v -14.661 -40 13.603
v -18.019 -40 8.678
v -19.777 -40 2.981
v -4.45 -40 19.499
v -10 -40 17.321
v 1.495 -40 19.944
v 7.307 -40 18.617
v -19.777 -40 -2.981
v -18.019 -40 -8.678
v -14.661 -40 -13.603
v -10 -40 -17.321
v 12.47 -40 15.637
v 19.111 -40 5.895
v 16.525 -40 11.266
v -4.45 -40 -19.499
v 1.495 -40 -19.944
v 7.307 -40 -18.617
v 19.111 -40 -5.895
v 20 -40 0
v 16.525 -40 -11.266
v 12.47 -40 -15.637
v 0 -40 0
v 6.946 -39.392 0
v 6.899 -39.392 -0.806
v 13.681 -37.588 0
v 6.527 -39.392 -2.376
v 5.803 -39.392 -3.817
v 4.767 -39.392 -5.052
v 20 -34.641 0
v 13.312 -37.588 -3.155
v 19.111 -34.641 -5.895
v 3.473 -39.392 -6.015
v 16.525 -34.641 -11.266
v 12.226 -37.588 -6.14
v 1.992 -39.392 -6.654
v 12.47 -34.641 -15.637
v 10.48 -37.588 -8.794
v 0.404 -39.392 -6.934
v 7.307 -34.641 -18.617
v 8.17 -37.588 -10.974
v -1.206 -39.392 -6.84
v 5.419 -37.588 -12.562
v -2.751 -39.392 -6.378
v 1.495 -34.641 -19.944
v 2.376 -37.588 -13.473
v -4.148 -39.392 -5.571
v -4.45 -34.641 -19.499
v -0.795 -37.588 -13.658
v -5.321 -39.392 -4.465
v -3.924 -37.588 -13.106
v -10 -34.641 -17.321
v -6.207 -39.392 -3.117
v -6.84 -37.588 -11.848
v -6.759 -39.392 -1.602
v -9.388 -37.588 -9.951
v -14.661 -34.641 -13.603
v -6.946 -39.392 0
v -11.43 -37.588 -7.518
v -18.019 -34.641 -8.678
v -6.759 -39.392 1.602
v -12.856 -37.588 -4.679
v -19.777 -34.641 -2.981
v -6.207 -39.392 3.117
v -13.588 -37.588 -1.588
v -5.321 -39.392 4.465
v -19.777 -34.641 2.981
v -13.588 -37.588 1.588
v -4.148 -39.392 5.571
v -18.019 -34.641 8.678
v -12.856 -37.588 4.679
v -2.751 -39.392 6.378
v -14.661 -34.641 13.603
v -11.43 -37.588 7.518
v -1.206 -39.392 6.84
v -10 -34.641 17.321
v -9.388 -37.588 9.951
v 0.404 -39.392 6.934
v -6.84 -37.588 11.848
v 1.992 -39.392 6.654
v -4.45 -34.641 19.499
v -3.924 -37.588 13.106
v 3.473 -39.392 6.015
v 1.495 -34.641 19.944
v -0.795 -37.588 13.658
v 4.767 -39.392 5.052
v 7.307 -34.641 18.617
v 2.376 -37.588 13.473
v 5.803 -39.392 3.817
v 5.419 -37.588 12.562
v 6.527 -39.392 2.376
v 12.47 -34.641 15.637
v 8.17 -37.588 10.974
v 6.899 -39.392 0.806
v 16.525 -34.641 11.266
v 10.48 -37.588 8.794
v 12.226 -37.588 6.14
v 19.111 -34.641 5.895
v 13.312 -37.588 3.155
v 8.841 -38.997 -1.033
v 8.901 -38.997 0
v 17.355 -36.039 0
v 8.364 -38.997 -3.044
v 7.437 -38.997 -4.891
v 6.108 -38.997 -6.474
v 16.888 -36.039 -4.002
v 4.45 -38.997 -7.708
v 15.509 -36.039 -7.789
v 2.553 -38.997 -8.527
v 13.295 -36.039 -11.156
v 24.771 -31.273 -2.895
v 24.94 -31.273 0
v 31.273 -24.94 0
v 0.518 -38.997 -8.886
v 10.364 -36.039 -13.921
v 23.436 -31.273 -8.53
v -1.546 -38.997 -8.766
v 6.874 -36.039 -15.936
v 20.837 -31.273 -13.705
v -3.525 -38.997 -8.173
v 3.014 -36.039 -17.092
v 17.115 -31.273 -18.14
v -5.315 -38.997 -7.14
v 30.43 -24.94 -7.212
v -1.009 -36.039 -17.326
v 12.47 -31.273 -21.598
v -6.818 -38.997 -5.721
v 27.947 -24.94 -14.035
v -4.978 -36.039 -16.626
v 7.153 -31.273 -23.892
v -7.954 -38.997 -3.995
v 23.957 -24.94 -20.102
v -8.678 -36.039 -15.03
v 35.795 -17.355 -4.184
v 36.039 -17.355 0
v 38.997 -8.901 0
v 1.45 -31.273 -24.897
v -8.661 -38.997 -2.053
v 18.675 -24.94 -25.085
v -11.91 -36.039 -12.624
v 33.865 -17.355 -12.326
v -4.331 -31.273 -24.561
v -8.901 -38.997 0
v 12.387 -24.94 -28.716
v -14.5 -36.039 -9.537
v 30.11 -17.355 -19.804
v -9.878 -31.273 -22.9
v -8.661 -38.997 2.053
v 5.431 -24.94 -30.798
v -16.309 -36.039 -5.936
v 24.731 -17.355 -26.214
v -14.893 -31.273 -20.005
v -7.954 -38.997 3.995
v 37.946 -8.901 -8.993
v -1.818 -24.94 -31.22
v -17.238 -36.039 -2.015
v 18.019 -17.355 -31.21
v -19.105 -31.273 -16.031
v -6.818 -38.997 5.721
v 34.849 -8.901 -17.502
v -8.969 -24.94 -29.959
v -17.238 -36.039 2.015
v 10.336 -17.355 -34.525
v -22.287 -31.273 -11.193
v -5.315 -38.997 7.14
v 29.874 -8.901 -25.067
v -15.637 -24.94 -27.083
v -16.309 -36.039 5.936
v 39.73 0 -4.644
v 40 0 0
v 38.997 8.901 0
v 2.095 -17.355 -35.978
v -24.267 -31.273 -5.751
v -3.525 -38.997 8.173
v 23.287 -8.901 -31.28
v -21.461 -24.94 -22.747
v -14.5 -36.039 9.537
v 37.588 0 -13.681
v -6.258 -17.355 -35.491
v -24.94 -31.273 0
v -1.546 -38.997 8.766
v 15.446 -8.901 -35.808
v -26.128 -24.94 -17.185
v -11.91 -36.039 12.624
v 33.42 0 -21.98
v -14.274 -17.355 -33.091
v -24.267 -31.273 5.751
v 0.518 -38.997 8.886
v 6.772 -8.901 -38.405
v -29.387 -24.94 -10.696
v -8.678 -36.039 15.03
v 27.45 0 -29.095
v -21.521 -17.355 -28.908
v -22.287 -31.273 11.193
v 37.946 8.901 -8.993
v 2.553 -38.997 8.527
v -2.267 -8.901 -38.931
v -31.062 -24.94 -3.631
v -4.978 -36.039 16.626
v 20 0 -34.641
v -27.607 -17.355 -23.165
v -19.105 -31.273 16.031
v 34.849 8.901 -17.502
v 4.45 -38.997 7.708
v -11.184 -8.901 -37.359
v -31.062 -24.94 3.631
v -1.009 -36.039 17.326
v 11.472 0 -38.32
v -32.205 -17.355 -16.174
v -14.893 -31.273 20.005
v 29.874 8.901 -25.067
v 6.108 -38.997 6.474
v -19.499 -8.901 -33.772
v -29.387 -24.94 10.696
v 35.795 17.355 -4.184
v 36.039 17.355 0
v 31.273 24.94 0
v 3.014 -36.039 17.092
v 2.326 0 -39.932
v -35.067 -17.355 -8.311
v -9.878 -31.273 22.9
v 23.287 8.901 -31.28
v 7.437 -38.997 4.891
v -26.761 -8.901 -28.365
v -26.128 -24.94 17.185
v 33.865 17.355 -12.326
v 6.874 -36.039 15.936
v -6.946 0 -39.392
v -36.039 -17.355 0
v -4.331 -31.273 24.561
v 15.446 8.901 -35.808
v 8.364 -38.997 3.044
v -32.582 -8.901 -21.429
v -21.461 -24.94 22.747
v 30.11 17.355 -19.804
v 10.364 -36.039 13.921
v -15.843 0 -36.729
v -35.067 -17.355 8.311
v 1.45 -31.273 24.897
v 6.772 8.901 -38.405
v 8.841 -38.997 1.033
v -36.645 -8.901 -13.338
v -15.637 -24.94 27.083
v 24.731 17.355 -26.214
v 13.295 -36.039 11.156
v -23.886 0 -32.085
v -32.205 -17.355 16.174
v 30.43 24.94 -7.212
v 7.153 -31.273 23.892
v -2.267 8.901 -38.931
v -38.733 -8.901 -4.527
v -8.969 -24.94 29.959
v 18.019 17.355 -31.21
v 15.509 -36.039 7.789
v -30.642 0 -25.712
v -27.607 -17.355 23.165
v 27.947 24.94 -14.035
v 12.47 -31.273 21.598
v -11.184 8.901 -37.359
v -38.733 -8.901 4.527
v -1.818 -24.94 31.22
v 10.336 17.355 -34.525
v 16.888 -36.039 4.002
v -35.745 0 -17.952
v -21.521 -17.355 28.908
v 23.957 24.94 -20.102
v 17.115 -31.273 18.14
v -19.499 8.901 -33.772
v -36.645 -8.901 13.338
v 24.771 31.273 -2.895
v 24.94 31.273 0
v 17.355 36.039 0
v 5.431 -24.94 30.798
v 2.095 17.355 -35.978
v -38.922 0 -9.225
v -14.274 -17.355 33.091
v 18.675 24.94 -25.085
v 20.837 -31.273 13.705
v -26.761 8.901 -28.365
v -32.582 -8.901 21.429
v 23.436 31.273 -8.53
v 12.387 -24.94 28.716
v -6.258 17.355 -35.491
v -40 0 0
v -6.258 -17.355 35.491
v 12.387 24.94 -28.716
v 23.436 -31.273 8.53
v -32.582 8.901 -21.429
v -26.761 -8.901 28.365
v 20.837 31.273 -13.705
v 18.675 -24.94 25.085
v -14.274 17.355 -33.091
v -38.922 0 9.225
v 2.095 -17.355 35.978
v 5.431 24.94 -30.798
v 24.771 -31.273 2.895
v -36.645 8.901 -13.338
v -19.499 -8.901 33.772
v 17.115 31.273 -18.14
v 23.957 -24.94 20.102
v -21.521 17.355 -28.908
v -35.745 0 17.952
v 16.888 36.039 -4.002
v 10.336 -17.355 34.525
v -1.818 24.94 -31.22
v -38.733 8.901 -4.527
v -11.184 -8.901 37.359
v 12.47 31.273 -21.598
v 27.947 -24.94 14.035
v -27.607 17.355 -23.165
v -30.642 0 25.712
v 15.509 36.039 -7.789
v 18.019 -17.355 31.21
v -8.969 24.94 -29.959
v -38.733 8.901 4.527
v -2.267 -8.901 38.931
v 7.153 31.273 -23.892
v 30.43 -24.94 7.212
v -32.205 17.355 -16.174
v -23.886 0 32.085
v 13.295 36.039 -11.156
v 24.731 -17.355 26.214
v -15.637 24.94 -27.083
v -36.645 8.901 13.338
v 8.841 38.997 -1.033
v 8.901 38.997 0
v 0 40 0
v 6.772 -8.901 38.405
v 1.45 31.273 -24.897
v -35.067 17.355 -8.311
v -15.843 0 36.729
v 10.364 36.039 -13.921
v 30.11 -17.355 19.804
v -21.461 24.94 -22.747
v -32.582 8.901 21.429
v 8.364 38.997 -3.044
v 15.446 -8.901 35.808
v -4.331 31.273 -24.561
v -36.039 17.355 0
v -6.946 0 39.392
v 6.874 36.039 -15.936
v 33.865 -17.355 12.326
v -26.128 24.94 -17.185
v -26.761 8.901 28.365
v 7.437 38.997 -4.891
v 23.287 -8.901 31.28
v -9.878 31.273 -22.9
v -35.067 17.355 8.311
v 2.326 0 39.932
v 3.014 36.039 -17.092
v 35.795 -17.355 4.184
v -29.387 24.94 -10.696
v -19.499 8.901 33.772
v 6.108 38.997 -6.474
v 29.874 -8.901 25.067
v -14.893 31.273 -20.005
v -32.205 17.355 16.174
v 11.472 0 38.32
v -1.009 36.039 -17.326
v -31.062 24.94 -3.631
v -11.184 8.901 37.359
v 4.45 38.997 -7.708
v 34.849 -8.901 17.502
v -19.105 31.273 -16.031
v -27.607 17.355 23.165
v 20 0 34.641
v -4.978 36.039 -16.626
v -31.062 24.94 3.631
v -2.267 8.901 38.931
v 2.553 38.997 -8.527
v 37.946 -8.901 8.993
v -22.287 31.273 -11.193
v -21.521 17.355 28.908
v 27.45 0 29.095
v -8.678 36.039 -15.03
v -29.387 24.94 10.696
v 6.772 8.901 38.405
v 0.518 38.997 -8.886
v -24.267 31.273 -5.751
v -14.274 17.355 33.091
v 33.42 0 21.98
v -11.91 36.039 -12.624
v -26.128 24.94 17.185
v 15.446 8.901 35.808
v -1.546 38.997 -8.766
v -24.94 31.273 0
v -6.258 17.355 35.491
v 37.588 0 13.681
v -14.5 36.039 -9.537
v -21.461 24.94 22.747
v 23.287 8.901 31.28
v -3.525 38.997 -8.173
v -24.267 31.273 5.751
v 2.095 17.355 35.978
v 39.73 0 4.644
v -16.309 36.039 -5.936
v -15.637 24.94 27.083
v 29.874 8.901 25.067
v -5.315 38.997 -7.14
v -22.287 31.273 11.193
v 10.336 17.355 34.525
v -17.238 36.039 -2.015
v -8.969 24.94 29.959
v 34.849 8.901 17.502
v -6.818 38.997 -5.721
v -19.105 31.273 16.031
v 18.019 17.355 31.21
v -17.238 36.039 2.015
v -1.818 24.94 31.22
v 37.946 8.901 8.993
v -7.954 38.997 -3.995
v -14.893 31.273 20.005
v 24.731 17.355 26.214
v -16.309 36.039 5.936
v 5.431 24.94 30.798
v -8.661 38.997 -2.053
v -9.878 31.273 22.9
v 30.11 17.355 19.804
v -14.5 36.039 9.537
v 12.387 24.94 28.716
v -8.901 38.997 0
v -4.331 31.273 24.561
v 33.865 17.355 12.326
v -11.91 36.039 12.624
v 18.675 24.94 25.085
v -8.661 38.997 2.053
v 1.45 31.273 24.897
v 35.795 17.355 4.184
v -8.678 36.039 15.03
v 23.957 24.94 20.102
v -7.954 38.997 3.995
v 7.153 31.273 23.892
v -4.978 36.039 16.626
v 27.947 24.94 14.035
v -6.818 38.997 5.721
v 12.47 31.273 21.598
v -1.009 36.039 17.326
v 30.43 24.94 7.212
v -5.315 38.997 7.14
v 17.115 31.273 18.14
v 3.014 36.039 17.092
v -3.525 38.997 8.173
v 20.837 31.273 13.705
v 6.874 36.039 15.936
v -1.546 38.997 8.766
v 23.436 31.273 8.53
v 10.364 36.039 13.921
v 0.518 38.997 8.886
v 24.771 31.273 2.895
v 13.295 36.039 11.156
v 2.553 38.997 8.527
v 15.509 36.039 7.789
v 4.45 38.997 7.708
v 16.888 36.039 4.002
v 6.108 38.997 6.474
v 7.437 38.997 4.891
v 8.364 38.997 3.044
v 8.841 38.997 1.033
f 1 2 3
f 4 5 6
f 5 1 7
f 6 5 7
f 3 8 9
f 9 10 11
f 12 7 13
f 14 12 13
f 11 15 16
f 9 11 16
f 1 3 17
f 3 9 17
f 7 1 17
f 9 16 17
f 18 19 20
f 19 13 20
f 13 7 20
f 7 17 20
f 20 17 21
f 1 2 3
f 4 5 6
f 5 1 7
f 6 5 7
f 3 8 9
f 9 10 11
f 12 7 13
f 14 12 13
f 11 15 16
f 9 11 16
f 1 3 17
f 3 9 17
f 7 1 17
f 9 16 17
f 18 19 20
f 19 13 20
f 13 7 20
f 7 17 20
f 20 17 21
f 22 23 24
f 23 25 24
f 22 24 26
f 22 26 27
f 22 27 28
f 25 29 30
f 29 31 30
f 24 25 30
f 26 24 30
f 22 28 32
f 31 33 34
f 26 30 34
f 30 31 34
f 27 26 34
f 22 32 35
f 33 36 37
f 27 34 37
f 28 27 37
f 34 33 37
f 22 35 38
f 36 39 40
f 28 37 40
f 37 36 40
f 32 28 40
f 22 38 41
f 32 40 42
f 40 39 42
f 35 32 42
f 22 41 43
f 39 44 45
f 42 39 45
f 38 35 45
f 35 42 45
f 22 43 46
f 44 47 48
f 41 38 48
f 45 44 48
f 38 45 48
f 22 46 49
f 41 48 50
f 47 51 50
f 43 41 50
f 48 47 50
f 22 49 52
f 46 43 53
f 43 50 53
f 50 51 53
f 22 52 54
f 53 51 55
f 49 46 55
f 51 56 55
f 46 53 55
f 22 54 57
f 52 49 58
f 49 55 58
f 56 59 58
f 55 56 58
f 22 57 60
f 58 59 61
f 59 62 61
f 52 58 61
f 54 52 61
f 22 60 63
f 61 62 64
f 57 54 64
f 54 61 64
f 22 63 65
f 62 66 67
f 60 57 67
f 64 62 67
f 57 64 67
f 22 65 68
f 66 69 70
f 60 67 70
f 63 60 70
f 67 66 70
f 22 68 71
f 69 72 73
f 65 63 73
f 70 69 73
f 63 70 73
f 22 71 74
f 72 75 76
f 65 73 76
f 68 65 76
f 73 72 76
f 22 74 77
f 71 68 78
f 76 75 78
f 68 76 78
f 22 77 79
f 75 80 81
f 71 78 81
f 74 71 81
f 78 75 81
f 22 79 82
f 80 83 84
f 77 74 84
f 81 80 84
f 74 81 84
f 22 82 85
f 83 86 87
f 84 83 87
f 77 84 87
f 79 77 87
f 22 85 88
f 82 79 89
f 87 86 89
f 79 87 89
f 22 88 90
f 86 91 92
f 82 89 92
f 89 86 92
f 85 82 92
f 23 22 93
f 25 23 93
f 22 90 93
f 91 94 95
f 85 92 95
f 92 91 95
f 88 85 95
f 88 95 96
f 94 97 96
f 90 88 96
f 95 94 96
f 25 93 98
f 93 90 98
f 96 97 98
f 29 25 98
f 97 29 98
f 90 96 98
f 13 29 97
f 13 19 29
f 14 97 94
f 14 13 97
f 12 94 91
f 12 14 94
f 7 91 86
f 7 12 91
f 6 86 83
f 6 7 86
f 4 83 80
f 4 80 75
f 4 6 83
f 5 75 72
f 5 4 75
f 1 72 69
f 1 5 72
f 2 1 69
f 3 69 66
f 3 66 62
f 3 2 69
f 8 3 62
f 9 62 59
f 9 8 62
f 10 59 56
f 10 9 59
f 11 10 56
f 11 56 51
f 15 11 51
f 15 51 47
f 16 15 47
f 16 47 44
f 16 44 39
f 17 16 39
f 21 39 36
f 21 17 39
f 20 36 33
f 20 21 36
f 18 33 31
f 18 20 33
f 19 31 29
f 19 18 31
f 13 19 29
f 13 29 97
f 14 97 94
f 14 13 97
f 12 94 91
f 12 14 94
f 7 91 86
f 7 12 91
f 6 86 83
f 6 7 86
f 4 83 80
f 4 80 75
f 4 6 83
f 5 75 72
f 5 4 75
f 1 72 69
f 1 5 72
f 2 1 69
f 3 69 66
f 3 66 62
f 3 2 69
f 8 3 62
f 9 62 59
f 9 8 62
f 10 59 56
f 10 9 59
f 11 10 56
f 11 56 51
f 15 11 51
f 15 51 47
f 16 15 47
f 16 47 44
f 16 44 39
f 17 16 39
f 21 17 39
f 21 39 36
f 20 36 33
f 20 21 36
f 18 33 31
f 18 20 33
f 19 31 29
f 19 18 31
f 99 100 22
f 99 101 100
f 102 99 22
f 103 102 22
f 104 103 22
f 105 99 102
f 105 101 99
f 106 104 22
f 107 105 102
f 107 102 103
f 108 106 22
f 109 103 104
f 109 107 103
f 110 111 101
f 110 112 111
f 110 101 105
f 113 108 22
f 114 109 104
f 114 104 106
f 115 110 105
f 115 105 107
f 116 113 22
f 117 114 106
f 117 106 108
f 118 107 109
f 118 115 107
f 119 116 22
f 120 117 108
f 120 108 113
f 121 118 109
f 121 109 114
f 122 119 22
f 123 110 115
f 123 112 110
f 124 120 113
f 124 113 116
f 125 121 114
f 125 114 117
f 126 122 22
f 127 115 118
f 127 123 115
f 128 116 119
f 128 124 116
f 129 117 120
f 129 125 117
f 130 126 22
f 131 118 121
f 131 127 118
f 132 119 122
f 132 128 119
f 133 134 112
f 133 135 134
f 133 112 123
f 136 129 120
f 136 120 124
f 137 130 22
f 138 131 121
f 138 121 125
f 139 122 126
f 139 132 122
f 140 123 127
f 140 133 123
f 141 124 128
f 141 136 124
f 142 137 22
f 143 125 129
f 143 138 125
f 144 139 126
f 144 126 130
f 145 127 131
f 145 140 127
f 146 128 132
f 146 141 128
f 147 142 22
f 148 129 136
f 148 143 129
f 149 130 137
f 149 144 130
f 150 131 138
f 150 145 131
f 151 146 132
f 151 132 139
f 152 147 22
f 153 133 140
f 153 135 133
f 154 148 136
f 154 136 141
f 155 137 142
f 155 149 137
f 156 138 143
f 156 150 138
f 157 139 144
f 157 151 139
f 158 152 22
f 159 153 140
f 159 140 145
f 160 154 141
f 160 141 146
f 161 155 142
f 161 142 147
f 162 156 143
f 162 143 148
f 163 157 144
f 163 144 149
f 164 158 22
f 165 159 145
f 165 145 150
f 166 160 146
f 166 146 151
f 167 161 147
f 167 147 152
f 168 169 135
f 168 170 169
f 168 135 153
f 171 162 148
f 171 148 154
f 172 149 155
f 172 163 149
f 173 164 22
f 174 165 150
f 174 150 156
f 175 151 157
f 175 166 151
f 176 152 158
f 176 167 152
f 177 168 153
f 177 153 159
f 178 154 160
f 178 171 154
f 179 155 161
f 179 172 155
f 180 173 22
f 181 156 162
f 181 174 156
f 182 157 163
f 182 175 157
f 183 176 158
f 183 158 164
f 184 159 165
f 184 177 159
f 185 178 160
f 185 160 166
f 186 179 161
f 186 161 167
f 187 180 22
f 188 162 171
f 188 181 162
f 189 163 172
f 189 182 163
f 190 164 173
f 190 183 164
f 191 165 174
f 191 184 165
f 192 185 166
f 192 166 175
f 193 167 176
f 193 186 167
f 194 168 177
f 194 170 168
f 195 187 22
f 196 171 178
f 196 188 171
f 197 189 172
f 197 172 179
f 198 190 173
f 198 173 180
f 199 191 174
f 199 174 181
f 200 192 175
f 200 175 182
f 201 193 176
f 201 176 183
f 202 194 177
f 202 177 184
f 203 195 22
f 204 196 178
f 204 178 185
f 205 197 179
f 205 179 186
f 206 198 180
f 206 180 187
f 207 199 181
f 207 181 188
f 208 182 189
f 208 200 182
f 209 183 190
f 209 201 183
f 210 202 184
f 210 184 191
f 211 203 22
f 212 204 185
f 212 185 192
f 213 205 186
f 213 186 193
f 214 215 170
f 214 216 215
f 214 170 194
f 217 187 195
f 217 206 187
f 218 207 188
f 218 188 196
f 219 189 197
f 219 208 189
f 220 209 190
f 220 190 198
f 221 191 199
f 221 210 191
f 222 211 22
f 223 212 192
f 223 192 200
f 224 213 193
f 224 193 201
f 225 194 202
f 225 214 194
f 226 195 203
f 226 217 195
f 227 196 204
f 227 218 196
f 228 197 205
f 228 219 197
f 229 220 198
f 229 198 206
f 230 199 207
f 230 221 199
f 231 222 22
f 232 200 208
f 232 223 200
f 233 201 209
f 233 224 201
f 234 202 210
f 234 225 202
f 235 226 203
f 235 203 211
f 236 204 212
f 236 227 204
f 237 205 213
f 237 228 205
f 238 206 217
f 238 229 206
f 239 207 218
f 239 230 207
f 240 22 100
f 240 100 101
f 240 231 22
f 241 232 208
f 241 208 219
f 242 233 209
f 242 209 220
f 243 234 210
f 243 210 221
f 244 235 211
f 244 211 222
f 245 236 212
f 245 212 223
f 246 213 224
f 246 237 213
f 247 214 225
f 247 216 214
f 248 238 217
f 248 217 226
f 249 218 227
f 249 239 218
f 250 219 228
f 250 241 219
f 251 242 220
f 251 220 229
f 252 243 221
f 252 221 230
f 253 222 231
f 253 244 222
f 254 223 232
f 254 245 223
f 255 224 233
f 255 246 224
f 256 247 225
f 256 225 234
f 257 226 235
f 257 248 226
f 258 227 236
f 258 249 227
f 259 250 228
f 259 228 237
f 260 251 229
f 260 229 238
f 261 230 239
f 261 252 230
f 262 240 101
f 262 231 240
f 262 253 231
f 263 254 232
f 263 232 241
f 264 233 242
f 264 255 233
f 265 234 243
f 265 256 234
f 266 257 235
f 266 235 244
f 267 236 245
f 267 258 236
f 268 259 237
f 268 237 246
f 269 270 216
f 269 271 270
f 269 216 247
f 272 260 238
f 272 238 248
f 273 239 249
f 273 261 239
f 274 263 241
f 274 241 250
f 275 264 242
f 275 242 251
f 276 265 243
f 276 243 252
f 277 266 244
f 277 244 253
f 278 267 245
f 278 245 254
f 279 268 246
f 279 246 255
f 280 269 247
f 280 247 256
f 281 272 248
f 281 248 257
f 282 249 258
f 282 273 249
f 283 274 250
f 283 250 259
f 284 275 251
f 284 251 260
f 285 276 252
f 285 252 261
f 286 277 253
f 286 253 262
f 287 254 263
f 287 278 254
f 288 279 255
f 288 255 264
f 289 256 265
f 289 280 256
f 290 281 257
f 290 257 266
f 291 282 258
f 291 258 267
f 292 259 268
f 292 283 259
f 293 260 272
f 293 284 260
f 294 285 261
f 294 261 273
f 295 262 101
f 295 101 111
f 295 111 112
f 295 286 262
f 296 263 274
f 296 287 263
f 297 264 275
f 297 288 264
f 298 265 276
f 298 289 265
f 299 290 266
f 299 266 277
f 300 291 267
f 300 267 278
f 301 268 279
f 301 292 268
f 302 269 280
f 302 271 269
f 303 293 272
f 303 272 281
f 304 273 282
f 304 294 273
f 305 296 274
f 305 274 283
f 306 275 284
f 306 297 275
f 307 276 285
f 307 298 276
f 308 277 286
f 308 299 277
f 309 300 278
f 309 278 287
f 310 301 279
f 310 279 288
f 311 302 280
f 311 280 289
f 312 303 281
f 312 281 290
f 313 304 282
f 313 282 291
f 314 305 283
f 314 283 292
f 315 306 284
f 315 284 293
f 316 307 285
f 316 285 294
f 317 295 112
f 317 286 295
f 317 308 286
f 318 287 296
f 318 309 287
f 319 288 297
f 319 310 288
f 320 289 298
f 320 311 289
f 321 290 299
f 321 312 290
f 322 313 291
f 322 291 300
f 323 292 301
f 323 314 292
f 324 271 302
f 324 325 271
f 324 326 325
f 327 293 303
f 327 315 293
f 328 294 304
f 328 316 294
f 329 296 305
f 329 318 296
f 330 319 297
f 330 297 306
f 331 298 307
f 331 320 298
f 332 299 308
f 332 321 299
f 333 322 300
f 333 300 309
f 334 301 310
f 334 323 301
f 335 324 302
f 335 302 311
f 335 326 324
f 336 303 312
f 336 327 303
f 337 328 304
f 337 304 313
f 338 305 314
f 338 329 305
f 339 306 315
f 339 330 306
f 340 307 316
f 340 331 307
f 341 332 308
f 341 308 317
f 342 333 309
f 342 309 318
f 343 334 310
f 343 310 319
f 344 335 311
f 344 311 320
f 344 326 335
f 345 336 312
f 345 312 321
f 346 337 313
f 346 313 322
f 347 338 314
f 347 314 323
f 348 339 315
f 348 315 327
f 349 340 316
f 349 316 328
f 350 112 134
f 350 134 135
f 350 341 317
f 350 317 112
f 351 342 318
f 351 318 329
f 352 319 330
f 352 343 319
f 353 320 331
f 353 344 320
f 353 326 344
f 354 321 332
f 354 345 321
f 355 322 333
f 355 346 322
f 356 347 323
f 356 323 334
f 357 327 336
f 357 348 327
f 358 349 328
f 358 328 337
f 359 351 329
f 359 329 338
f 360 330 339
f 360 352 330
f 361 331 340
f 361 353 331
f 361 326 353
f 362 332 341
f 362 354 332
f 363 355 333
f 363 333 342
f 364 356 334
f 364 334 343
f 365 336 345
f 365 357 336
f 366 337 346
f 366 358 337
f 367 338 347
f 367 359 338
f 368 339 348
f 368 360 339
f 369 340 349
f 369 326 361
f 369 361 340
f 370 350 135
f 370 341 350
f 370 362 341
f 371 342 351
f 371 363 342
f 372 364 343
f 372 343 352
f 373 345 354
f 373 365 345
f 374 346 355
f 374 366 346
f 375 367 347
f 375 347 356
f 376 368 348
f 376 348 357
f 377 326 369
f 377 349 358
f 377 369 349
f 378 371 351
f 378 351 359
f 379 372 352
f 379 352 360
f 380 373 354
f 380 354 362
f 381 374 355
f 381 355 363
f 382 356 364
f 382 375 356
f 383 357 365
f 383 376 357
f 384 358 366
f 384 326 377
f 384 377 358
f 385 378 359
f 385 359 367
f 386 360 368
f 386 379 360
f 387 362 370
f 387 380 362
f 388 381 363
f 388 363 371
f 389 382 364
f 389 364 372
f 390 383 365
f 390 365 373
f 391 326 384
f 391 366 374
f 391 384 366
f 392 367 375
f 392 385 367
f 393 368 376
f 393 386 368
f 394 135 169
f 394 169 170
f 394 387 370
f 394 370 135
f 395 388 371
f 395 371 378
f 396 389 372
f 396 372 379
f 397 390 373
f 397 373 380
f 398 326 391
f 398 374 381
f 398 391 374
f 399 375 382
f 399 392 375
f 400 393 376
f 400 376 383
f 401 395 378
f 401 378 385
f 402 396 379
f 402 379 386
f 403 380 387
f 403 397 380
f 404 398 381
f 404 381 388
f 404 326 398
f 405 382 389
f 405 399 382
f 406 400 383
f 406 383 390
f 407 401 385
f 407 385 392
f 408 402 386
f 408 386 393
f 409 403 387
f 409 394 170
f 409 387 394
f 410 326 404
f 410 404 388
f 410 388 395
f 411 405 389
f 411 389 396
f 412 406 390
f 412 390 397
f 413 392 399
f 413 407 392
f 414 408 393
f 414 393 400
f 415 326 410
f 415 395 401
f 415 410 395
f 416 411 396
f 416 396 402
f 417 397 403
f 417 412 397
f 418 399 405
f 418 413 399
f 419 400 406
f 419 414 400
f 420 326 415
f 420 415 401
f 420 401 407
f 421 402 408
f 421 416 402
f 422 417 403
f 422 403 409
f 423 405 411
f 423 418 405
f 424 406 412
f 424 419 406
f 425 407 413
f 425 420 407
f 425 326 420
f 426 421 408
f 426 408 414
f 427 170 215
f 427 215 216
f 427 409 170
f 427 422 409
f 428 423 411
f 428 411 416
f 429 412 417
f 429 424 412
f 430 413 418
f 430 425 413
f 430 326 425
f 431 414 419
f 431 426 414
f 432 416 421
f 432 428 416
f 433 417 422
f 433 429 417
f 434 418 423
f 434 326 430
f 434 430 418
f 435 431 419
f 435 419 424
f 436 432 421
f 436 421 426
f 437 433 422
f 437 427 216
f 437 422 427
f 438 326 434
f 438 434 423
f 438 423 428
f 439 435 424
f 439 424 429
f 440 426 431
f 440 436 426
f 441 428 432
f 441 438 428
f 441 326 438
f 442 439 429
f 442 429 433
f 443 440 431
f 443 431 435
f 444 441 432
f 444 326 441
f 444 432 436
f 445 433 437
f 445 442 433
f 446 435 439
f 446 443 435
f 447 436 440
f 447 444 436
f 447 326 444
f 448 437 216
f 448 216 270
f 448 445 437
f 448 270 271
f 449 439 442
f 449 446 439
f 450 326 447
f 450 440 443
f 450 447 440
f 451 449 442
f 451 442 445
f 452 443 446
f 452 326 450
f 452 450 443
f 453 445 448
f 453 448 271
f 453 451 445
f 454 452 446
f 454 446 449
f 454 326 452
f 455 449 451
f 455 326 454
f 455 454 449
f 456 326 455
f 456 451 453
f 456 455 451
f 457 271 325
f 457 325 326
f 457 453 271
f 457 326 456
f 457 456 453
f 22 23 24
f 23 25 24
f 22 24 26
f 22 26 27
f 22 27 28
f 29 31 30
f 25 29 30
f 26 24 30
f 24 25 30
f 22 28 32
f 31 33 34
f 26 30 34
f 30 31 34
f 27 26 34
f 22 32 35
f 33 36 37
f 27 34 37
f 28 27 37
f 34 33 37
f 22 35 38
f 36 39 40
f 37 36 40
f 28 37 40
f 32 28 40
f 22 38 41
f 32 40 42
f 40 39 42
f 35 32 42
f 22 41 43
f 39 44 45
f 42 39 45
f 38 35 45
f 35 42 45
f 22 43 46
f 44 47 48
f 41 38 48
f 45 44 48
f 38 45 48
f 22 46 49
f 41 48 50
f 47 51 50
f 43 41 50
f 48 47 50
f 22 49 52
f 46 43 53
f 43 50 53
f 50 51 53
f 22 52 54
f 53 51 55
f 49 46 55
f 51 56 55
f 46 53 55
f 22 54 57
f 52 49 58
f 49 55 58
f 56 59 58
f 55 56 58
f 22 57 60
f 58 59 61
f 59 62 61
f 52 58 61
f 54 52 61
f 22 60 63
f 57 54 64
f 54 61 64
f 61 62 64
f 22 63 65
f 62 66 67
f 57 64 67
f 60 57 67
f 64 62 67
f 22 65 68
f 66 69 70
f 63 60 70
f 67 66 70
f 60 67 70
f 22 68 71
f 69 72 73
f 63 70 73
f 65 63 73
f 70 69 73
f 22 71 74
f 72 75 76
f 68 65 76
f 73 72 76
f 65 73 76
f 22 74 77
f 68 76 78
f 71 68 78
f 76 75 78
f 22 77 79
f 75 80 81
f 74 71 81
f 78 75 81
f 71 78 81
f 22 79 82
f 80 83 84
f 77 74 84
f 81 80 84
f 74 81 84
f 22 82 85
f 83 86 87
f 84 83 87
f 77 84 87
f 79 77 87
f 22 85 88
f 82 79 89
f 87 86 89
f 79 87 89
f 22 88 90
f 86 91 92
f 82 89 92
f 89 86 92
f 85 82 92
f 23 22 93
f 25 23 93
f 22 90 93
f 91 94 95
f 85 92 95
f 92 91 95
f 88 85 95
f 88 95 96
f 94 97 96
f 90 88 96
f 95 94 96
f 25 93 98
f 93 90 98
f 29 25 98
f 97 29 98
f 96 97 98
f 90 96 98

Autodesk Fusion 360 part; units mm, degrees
sphere "SpherePrimitive1" add diameter 80 placed x (1, 0, 0) y (0, 0, -1) z (0, 1, 0) at (0, 0, 0) makes body 1 in component "sphere"
ref_plane "WorkPlane1" through (0, -40, 0) normal (0, 1, 0) x (0, 0, 1) in component "holder"
sketch "Sketch1" plane through (0, -40, 0) normal (0, 1, 0) x (1, 0, 0) in component "holder"
  circle A0 centre (0, 0) radius 20
  dimension "d3" = 40
extrude "Extrude1" add sketch "Sketch1" along normal blind 10 separate body makes body 2 in component "holder"
combine "Combine1" operation cut target body 2 tool bodies 1 keep tools in component "holder"
ref_plane "WorkPlane1" through (0, -40, 0) normal (0, 1, 0) x (0, 0, 1) in component "holder (1)"
sketch "Sketch1 (2)" plane through (0, -40, 0) normal (0, 1, 0) x (1, 0, 0) in component "holder (1)"
  circle A0 centre (0, 0) radius 20
  dimension "d3_1" = 40
extrude "Extrude1'" add sketch "Sketch1 (2)" along normal blind 10 separate body makes body 3 in component "holder (1)"
combine "Combine1'" operation cut target body 3 tool bodies 1 keep tools in component "holder (1)"
component "sphere" placed x (1, 0, 0) y (0, 1, 0) z (0, 0, 1) at (0, 0, 0)
component "holder" placed x (1, 0, 0) y (0, 1, 0) z (0, 0, 1) at (0, 0, 0)
component "holder (1)" placed x (1, 0, 0) y (0, 1, 0) z (0, 0, 1) at (0, 0, 0)
